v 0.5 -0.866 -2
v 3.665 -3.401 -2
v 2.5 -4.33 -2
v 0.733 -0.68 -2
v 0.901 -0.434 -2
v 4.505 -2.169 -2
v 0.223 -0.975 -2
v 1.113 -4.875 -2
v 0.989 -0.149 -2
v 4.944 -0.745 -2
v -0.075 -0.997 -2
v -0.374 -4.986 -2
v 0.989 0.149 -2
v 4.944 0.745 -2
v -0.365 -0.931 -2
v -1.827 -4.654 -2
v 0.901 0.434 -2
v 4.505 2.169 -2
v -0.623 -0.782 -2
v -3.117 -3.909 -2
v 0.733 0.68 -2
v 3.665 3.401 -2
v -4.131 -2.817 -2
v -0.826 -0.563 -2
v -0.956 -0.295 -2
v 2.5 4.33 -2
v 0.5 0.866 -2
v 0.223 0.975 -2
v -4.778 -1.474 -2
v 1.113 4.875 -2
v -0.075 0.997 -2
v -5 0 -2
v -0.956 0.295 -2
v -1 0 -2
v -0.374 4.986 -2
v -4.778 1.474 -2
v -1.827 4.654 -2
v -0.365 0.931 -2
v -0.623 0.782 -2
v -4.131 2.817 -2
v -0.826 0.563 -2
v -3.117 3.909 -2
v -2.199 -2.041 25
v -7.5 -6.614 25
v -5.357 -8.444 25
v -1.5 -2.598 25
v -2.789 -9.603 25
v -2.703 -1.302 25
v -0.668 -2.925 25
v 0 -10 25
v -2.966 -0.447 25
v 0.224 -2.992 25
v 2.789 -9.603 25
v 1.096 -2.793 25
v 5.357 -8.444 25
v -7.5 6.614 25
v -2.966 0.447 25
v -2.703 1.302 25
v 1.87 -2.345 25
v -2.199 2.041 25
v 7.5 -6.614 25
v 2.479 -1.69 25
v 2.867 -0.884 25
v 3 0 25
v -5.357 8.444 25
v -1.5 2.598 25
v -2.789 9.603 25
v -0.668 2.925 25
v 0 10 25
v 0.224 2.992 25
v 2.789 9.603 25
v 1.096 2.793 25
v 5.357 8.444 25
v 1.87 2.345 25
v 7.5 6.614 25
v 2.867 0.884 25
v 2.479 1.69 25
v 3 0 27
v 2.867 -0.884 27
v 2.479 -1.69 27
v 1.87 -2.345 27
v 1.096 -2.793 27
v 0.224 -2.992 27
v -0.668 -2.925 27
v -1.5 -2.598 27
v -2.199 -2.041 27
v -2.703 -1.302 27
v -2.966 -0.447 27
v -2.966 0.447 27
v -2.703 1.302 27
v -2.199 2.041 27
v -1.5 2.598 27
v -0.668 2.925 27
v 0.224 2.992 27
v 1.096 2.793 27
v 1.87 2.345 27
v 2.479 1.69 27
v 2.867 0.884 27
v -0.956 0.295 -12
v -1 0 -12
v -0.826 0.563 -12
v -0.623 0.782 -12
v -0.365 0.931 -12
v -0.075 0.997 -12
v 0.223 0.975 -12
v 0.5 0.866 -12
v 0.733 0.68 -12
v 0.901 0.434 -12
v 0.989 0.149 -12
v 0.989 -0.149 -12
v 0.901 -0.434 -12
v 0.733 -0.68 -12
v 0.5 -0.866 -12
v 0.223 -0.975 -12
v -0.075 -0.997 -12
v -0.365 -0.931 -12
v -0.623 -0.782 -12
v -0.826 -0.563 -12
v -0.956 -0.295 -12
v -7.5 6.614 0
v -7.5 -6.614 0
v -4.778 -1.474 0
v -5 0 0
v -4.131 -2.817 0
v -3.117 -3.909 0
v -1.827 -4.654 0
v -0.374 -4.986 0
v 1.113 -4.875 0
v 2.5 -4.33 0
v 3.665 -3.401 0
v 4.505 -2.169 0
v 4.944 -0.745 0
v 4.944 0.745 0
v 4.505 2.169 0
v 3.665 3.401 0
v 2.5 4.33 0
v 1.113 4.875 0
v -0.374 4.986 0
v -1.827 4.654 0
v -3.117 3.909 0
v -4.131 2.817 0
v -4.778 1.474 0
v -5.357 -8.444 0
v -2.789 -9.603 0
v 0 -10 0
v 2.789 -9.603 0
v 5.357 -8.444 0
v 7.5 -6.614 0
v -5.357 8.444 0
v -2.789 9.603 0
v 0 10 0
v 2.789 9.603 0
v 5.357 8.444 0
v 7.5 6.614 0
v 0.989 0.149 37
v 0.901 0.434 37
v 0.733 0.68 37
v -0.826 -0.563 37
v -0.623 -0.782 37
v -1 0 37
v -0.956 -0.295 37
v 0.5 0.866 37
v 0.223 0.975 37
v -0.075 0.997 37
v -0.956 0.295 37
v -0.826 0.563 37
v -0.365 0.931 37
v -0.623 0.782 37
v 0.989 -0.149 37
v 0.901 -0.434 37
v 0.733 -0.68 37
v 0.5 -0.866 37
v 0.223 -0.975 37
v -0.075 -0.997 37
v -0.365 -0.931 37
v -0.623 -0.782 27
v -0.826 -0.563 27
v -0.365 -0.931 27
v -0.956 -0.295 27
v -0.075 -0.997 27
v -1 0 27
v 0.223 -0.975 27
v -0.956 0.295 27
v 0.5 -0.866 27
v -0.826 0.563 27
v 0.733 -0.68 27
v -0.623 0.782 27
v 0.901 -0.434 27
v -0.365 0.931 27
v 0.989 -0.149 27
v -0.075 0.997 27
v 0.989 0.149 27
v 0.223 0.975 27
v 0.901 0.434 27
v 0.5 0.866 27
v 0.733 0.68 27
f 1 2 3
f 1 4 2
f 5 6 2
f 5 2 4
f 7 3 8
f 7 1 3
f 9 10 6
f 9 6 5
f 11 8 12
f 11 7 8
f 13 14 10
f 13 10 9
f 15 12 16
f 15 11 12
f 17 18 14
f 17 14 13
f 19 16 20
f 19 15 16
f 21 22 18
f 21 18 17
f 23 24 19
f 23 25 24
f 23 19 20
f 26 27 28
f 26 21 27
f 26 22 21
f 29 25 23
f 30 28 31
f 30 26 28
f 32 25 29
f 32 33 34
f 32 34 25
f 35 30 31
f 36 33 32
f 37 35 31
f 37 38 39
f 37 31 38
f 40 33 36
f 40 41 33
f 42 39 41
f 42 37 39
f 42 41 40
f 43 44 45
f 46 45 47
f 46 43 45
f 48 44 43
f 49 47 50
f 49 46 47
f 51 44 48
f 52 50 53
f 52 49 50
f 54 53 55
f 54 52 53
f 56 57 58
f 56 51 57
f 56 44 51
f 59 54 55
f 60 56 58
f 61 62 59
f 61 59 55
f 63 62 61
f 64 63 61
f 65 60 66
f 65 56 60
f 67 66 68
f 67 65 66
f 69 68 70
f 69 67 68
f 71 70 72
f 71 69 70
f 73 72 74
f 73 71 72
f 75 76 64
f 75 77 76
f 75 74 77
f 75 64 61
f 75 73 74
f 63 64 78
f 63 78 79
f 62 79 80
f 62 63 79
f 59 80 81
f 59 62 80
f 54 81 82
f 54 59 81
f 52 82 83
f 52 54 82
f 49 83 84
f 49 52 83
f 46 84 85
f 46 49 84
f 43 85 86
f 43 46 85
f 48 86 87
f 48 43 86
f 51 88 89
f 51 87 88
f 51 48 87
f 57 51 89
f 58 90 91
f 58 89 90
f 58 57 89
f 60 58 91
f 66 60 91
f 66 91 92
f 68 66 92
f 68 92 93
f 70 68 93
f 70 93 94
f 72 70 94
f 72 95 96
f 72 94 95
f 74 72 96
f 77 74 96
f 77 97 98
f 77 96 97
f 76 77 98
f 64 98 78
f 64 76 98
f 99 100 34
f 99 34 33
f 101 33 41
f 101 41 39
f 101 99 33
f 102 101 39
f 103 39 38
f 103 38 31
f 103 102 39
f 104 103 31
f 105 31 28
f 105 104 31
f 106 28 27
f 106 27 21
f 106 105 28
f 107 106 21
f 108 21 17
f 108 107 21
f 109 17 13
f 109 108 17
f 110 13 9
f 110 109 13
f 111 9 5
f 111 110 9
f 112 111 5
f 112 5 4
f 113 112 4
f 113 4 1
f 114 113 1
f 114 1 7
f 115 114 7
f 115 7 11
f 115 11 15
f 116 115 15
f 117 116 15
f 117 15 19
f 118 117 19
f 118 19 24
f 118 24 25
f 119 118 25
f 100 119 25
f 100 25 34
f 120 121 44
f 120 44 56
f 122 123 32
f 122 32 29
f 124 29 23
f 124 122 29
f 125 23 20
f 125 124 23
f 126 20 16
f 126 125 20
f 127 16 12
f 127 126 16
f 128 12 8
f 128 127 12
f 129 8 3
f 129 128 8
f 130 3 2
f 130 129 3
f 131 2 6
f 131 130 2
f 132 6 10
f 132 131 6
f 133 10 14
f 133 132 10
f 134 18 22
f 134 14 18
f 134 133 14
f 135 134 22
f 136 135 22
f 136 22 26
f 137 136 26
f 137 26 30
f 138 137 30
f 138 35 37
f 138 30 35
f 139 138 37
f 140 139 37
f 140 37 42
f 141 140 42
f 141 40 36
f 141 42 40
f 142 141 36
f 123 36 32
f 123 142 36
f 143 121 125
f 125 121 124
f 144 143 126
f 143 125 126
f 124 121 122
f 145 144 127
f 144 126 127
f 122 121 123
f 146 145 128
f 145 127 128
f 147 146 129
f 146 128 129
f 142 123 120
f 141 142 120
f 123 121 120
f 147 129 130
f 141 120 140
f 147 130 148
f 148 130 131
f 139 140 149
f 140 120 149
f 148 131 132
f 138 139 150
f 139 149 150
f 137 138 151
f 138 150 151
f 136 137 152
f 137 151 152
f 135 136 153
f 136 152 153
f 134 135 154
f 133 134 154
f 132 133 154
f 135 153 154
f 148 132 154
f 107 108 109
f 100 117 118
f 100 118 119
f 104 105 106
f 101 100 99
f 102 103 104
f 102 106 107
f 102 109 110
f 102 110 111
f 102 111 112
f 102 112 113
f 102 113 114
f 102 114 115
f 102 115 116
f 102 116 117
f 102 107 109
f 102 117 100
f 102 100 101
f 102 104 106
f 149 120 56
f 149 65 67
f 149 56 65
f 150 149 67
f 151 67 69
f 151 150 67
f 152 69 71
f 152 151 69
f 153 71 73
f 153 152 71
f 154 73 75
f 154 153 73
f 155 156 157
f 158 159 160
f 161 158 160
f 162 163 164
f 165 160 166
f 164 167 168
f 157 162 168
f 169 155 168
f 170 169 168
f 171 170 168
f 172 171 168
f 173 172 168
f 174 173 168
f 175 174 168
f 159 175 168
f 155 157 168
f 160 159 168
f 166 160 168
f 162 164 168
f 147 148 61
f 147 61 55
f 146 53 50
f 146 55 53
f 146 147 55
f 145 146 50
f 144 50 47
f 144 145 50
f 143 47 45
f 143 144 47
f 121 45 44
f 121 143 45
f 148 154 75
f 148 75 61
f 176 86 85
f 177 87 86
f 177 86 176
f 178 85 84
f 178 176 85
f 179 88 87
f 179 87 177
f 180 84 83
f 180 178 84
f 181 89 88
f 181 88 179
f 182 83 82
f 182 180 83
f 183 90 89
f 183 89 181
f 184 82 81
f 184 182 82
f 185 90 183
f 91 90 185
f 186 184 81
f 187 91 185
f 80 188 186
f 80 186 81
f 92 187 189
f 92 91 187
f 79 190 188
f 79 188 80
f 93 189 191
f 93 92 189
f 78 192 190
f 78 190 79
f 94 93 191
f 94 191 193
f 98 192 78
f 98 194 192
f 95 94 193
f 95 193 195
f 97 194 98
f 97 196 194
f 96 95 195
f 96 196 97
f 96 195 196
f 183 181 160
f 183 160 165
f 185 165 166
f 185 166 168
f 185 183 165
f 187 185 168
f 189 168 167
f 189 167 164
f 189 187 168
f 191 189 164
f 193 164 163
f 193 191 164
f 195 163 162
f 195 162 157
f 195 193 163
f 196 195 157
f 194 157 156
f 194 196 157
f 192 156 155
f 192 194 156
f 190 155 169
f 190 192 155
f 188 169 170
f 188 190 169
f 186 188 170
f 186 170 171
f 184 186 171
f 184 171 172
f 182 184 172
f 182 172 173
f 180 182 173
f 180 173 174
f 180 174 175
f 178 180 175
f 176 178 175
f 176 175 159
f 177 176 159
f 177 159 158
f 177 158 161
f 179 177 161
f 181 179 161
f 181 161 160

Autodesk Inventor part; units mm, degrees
ref_plane "YZ Plane" through (0, 0, 0) normal (1, 0, 0) x (0, 1, 0)
ref_plane "XZ Plane" through (0, 0, 0) normal (0, 1, 0) x (-1, 0, 0)
sketch "スケッチ1" plane through (0, 0, 0) normal (0, 0, 1) x (1, 0, 0)
  circle A0 centre (0, 0) radius 10
  line L0 (-7.5, 6.6144) -> (7.5, 6.6144) construction
  line L1 (7.5, 6.6144) -> (7.5, -6.6144)
  line L2 (7.5, -6.6144) -> (-7.5, -6.6144) construction
  line L3 (-7.5, -6.6144) -> (-7.5, 6.6144)
  dimension "d0" = 20
  dimension "d1" = 15
extrude "押し出し1" add sketch "スケッチ1" along normal blind 25 contours L1 A0 L3
sketch "スケッチ2" plane through (0, 0, 25) normal (0, 0, 1) x (1, 0, 0)
  circle A0 centre (0, 0) radius 3
  dimension "d4" = 6
extrude "押し出し2" add sketch "スケッチ2" along normal blind 2
sketch "スケッチ3" plane through (0, 0, 0) normal (0, 0, -1) x (-1, 0, 0)
  circle A0 centre (0, 0) radius 5
  dimension "d7" = 10
extrude "押し出し3" add sketch "スケッチ3" along normal blind 2
ref_plane "作業平面1" through (0, 0, -12) normal (0, 0, -1) x (-1, 0, 0)
sketch "スケッチ4" plane through (0, 0, -12) normal (0, 0, -1) x (-1, 0, 0)
  circle A0 centre (0, 0) radius 1
  dimension "d11" = 2
extrude "押し出し4" add sketch "スケッチ4" against normal blind 49
properties part number "Motor_400"
